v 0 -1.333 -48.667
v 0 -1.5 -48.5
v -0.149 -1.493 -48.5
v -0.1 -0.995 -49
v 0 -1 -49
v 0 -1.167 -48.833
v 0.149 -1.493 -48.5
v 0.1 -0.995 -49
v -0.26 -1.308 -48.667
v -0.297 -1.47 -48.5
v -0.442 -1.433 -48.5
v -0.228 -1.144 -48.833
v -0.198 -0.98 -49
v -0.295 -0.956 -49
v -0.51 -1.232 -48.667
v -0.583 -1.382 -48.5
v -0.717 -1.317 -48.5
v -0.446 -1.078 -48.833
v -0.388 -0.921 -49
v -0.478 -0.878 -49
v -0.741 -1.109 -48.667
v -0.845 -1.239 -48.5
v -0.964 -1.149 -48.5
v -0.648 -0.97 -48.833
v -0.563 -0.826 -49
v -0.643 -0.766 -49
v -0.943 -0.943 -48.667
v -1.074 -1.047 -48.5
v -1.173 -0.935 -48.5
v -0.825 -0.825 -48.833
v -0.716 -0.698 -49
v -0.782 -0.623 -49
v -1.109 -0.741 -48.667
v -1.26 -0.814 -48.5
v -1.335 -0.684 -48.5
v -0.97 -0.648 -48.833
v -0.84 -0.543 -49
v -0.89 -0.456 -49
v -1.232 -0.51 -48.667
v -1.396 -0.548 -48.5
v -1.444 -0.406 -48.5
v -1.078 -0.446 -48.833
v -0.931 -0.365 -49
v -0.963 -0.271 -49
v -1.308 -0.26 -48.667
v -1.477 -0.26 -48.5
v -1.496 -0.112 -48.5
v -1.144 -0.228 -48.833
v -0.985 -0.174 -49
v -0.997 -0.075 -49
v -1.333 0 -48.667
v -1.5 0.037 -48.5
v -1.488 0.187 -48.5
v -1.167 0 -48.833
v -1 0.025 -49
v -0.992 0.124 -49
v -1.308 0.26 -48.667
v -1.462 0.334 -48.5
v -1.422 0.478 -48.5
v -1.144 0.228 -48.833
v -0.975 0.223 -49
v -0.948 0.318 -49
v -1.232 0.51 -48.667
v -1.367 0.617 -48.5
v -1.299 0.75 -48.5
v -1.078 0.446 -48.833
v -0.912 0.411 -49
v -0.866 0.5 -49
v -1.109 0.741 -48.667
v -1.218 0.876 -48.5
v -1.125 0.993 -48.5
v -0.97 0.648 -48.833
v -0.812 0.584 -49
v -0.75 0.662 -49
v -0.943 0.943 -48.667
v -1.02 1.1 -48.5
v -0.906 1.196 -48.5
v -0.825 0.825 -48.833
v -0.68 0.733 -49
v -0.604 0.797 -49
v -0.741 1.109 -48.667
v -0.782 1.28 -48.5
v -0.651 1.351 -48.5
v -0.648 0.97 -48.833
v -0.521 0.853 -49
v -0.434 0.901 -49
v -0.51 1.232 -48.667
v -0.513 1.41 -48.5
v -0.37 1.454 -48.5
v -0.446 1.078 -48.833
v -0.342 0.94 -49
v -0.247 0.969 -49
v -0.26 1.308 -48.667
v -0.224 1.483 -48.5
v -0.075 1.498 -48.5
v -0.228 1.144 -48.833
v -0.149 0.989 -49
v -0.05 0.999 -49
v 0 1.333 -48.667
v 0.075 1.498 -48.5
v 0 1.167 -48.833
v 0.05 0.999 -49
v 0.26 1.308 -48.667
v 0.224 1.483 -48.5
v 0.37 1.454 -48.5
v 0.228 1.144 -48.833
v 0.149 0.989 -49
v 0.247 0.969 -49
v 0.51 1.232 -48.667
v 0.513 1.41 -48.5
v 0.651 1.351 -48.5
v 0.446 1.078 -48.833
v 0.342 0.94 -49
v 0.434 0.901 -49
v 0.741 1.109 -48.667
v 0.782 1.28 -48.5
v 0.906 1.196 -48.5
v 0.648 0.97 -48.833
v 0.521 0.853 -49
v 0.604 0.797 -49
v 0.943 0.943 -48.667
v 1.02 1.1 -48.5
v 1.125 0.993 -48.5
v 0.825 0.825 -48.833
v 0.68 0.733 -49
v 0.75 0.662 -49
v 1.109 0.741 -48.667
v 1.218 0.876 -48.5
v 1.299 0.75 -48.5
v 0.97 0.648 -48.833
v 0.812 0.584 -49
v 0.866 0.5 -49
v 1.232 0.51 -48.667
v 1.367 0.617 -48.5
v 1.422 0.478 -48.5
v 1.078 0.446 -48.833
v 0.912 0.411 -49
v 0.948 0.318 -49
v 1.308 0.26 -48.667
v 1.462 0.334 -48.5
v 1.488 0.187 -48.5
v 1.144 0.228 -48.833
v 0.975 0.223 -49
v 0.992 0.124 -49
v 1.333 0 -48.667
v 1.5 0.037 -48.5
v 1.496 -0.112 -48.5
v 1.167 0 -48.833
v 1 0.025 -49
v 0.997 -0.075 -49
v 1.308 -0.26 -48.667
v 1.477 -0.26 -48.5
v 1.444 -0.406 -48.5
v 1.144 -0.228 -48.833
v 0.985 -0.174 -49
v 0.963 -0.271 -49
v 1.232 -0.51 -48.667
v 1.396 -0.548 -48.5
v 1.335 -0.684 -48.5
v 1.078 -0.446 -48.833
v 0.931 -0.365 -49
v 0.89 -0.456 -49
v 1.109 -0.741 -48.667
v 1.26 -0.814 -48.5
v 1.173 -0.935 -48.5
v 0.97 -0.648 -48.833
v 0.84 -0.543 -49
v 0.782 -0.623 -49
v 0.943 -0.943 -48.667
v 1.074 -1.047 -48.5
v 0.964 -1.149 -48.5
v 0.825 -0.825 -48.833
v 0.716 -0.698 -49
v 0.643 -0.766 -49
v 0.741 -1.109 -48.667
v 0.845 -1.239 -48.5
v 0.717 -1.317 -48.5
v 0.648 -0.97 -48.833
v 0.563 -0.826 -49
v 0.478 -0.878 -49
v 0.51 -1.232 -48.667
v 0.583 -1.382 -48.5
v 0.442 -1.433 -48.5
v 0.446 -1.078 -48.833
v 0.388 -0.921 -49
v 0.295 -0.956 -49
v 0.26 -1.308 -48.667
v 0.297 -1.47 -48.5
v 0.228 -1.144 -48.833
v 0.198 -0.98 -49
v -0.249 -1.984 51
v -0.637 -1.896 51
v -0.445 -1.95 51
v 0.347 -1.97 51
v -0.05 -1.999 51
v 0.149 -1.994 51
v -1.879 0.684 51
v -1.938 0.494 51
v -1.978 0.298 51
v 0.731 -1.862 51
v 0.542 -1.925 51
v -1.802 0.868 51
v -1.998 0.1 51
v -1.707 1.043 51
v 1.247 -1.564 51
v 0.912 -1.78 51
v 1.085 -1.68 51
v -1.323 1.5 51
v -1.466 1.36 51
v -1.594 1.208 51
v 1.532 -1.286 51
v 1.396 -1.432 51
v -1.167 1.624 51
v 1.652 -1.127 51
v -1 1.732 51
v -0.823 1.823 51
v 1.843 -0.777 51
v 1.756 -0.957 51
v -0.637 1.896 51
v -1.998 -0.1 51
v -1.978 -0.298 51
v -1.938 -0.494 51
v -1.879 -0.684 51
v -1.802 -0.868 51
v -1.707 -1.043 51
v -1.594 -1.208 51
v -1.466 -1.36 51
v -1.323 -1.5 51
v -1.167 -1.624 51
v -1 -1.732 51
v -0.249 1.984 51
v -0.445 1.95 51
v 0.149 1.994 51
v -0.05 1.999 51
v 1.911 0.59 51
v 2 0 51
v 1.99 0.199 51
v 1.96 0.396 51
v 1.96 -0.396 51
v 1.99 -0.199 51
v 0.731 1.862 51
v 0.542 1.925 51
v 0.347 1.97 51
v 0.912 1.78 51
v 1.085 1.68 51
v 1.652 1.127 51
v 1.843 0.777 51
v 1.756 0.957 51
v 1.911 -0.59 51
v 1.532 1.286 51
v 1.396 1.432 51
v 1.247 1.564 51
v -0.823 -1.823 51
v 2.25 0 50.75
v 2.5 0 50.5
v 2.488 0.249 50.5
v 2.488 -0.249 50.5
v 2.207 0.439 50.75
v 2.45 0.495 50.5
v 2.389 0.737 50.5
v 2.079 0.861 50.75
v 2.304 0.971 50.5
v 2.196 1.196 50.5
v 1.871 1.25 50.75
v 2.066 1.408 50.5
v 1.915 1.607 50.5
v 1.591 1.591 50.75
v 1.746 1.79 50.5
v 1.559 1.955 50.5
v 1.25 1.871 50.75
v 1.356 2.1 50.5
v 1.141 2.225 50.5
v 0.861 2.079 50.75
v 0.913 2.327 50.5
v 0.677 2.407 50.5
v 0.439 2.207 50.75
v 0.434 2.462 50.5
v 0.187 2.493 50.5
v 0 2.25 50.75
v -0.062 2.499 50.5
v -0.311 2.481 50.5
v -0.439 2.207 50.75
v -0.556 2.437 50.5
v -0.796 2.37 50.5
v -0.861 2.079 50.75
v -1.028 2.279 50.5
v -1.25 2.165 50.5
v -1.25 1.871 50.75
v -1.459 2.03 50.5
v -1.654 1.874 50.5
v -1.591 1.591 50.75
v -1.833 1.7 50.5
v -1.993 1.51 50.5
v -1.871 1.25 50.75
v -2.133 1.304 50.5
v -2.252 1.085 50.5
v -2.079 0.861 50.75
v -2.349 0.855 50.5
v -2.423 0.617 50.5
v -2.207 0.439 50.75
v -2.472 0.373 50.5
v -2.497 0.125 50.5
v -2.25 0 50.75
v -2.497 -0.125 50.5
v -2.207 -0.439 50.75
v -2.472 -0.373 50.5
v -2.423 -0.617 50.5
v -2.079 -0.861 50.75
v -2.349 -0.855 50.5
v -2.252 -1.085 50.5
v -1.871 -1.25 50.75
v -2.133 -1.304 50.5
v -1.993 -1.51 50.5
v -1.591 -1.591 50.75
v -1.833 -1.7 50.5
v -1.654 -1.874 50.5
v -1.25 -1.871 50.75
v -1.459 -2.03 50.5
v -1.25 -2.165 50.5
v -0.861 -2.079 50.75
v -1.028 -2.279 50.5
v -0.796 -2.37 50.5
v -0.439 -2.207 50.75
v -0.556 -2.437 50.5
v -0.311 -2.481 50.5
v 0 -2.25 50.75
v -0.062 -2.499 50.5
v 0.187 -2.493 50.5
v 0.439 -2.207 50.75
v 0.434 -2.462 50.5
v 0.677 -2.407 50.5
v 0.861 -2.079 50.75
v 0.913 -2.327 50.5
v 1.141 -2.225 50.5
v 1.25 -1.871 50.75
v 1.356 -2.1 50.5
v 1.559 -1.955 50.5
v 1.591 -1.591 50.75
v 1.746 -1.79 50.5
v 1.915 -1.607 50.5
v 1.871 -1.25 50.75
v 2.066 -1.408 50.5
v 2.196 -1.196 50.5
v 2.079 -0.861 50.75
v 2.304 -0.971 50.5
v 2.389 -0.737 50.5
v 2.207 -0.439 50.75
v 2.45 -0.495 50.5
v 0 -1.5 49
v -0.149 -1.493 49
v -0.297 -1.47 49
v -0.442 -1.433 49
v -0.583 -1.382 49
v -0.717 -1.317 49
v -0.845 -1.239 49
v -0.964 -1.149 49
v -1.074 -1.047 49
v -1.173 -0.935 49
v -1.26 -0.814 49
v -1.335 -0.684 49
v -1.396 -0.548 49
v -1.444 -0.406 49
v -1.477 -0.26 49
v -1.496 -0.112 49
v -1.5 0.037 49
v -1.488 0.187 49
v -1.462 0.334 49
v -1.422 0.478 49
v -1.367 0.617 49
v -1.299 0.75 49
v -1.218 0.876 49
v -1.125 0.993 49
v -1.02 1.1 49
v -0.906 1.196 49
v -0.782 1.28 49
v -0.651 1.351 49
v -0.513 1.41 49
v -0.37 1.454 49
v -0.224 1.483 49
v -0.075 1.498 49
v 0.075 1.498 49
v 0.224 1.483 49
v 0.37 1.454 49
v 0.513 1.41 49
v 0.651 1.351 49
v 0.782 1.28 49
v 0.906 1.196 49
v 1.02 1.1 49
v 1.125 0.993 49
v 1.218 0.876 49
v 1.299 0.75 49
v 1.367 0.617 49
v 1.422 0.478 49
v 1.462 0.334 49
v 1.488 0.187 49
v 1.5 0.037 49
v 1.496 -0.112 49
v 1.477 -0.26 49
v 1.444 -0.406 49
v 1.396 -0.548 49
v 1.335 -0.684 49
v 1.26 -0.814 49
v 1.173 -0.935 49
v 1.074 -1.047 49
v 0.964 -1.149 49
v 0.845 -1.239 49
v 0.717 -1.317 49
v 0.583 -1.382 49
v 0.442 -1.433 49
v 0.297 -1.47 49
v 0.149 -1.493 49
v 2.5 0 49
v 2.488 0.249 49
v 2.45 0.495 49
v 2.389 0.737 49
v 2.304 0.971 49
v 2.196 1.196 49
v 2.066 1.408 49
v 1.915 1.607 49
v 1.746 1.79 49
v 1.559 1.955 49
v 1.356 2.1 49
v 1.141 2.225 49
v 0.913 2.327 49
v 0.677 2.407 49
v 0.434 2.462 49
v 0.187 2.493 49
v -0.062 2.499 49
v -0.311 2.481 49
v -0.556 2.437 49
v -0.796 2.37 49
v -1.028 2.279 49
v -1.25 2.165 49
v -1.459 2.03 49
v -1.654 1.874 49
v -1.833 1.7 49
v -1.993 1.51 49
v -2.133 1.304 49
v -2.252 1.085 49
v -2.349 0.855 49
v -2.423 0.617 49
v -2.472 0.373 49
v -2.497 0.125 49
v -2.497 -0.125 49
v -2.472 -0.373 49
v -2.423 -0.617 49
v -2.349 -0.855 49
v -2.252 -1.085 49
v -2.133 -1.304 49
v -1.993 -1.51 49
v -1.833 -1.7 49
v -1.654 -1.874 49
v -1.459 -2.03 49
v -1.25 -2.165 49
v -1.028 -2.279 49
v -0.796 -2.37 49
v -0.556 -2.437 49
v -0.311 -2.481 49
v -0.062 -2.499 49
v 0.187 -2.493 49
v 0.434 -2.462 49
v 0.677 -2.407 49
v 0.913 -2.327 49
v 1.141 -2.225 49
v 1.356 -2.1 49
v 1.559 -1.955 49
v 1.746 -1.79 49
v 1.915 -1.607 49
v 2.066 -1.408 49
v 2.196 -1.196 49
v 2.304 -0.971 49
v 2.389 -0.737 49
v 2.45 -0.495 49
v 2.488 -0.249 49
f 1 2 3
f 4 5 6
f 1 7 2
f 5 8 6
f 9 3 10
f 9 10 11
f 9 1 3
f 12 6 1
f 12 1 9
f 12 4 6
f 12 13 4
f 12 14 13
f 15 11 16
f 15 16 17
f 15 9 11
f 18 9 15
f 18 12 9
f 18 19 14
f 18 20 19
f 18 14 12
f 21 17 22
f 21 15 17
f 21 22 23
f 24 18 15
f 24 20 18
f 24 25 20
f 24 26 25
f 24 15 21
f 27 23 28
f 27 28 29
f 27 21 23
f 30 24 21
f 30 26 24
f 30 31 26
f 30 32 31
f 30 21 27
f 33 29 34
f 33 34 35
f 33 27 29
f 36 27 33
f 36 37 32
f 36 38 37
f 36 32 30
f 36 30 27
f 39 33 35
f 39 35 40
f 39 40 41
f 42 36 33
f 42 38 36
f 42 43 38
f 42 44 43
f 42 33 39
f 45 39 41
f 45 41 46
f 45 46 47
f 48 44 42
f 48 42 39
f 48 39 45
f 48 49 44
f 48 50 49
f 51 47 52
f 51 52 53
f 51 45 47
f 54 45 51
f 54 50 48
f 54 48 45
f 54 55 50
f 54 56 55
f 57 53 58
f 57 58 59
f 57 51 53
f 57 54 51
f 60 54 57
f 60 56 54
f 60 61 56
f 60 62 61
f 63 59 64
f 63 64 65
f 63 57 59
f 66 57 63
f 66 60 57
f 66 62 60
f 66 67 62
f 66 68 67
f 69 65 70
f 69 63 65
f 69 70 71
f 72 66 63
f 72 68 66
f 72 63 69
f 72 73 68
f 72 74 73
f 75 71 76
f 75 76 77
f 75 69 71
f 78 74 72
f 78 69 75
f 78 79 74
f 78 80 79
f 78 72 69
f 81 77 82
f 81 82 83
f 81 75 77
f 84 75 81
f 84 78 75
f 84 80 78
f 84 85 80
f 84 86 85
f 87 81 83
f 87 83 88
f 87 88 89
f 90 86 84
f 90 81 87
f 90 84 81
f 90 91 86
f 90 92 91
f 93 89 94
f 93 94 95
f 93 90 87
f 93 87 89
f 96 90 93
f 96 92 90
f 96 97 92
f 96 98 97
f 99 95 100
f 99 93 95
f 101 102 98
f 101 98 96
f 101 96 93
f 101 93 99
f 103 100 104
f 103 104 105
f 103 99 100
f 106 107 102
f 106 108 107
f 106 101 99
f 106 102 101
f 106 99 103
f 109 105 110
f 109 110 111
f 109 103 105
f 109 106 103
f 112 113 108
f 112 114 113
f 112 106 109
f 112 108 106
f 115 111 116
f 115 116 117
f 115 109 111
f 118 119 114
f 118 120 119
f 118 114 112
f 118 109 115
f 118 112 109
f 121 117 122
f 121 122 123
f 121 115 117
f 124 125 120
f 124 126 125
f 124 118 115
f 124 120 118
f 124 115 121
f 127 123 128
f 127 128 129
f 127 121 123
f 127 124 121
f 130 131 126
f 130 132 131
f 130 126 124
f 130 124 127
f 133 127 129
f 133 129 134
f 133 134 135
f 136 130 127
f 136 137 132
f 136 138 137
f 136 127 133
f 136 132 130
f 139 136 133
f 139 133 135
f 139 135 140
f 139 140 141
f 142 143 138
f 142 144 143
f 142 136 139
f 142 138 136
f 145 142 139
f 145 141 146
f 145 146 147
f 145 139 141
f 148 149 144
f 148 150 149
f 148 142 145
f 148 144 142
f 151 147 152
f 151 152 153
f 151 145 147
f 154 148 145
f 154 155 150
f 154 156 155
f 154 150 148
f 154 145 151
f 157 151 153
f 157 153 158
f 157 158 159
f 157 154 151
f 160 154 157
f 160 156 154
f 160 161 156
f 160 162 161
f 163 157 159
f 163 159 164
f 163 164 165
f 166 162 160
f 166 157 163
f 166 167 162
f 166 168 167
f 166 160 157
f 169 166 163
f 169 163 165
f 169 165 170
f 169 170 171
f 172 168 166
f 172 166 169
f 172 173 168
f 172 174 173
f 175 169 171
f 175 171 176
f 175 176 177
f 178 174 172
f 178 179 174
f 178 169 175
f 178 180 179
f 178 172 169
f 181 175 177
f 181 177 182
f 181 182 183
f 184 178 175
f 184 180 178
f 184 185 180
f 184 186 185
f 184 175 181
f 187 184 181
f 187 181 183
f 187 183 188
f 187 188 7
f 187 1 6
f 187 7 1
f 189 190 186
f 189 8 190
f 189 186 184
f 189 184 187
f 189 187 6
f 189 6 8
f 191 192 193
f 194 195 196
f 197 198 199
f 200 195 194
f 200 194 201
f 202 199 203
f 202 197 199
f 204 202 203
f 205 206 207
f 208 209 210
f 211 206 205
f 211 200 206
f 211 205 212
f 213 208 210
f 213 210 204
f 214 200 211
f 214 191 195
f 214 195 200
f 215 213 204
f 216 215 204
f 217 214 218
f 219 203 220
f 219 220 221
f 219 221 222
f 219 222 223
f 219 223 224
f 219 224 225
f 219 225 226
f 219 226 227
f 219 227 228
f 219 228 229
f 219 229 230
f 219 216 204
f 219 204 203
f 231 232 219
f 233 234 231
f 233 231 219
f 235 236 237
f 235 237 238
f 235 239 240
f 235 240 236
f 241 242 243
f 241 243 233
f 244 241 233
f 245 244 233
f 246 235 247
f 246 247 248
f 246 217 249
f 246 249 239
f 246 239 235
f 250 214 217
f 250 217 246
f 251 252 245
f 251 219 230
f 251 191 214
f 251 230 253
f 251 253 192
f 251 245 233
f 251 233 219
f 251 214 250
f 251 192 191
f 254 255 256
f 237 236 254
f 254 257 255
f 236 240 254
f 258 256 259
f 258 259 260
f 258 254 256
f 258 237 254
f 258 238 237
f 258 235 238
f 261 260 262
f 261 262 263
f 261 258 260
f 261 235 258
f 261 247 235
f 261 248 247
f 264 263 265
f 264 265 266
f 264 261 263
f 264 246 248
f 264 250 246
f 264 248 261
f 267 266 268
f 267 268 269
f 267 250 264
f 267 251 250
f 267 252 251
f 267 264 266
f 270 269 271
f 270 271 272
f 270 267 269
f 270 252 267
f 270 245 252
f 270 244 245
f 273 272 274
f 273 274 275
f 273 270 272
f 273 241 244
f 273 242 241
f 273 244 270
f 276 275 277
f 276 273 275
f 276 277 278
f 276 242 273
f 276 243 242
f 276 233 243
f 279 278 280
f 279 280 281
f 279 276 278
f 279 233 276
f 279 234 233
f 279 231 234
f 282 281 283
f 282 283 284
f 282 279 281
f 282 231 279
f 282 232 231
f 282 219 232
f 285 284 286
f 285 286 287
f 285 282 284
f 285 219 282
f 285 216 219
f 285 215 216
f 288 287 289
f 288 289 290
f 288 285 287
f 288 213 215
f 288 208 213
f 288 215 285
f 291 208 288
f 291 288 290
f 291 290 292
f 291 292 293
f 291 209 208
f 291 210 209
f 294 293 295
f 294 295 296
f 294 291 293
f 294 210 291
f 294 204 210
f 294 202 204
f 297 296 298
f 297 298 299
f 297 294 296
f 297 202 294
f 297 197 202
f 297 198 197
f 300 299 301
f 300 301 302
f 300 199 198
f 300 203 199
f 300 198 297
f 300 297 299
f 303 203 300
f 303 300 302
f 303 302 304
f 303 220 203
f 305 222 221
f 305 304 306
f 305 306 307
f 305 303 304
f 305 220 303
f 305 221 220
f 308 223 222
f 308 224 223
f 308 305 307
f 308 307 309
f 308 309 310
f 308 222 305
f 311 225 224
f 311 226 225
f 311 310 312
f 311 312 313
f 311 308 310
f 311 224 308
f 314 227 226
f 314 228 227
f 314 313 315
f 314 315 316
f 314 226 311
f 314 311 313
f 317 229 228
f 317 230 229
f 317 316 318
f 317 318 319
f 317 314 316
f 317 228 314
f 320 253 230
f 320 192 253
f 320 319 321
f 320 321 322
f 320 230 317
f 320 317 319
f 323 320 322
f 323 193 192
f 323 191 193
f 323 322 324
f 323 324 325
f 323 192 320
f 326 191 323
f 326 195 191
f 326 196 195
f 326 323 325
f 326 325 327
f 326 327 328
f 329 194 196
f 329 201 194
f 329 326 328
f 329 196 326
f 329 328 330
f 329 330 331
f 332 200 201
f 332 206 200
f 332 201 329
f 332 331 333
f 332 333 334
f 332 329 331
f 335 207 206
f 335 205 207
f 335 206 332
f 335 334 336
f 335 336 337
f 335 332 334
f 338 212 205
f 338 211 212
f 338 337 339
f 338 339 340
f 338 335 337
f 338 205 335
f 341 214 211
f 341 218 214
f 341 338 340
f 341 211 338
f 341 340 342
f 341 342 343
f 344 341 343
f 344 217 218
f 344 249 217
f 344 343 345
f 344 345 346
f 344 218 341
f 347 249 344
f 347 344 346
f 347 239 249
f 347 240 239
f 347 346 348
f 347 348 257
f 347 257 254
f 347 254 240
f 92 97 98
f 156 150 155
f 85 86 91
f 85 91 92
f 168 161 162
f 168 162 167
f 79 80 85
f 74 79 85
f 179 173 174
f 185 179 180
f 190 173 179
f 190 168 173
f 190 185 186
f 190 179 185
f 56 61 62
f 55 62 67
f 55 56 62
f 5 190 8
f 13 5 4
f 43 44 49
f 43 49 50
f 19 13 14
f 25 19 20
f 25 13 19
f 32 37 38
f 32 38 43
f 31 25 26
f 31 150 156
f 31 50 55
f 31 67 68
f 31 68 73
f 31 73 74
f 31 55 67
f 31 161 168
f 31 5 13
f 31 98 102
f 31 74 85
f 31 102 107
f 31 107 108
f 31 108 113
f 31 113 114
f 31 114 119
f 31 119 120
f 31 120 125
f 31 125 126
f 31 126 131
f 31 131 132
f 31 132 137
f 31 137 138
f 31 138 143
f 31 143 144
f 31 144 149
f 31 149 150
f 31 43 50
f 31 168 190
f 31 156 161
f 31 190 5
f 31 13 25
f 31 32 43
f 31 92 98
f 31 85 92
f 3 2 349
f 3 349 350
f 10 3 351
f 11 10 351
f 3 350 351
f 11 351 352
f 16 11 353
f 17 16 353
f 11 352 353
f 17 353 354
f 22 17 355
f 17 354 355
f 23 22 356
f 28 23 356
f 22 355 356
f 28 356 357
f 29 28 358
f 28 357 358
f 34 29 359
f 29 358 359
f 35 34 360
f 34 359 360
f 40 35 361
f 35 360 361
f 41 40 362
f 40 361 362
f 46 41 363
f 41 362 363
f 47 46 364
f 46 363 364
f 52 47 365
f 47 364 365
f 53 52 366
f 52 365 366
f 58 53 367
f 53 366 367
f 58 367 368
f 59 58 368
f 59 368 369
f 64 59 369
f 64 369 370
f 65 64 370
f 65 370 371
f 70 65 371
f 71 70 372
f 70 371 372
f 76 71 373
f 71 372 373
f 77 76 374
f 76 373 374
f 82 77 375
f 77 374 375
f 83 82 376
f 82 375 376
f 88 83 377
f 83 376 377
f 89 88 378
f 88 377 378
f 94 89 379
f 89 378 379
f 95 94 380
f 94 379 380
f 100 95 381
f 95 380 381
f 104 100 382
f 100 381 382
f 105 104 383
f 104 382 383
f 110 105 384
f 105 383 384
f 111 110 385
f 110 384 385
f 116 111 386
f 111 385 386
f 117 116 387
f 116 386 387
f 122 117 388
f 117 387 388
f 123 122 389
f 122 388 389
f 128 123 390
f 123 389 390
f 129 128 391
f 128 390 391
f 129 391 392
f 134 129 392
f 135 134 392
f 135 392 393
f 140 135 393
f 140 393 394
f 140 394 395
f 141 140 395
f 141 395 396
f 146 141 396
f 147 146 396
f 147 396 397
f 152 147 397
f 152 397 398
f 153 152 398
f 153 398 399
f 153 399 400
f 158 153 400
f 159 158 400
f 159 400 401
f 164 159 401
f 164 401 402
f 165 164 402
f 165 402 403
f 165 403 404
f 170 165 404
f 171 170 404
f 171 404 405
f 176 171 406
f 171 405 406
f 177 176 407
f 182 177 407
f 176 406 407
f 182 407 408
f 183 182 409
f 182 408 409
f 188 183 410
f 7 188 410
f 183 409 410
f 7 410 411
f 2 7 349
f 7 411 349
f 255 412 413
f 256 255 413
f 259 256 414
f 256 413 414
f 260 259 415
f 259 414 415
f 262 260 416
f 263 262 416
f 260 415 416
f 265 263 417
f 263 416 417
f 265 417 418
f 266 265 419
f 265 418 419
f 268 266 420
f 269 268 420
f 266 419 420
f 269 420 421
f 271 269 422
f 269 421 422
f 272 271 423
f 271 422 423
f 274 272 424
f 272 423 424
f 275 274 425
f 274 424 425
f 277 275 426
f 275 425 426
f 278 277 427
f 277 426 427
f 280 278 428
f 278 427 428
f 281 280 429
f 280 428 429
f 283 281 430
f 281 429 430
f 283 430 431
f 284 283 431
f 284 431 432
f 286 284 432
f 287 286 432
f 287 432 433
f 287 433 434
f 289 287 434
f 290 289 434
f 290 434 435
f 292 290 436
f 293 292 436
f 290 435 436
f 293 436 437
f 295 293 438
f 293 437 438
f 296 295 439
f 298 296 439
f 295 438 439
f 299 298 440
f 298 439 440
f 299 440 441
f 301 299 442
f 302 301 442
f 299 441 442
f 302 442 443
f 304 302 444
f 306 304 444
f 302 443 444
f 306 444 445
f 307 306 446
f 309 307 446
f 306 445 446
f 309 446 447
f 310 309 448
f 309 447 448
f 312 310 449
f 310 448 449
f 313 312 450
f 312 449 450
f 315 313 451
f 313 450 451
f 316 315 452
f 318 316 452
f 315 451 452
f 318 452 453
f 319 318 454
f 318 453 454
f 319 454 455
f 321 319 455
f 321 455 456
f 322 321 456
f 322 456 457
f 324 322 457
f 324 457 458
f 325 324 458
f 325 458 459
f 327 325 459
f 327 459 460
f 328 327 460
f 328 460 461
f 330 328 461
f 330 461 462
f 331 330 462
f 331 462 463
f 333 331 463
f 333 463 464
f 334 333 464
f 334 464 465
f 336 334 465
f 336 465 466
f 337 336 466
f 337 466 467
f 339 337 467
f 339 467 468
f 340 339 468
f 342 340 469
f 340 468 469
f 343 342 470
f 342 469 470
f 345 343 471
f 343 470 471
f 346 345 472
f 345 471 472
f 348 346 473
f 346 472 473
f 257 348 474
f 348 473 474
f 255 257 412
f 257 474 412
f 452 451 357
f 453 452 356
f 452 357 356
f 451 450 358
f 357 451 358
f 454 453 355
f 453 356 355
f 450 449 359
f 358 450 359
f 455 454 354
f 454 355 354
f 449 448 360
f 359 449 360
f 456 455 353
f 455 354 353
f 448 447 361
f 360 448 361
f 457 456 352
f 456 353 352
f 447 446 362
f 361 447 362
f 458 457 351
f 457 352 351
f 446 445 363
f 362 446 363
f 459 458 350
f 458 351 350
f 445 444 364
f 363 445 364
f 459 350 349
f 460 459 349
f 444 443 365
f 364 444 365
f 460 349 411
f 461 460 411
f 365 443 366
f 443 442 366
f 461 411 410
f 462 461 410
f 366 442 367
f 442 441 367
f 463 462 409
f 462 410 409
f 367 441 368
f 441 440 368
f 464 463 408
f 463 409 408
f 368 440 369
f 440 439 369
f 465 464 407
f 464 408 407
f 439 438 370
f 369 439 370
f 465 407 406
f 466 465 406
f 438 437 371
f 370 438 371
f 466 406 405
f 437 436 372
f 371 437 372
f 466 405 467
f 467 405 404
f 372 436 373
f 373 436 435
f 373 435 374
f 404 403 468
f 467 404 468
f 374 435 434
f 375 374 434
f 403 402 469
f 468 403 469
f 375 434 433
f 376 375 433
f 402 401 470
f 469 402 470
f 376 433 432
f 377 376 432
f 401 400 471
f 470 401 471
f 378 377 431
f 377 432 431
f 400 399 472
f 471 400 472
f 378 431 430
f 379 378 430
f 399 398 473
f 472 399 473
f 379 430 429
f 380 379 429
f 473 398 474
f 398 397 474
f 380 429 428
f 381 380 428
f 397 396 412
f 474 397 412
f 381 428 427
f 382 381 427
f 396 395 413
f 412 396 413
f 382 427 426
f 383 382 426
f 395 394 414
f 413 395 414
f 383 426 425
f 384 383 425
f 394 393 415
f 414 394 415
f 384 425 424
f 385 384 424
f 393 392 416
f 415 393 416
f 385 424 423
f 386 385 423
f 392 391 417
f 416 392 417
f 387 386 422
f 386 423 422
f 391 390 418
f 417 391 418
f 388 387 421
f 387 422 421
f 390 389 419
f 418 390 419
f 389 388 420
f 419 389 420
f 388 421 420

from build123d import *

# Parameters (mm, degrees)
F0_W     = 1.5
F0_H     = 98
F2_SIZE  = 0.5
F3_R     = 2.5
F3_R_2   = 1.5
F4_DEPTH = 2
F5_SIZE  = 0.5


with BuildPart() as f1:
    # F0 (on Right) → F1 (revolve)
    with BuildSketch(Plane.YZ):
        with Locations((-0.75, 0)):
            Rectangle(F0_W, F0_H)
    revolve(axis=Axis((0, 0, 0), (0, 0, -1)))

    # F2
    f2_edges = [f1.edges().sort_by_distance(p)[0] for p in [
        (0, 1.5, -49),
    ]]
    chamfer(f2_edges, length=F2_SIZE)

    # F3 (on face) → F4 (join)
    with BuildSketch(Plane.XY.offset(49)):
        Circle(F3_R)
        Circle(F3_R_2, mode=Mode.SUBTRACT)
        Circle(F3_R_2)
    extrude(amount=F4_DEPTH)

    # F5
    f5_edges = [f1.edges().sort_by_distance(p)[0] for p in [
        (-2.5, 0, 51),
    ]]
    chamfer(f5_edges, length=F5_SIZE)


solid = f1.part
